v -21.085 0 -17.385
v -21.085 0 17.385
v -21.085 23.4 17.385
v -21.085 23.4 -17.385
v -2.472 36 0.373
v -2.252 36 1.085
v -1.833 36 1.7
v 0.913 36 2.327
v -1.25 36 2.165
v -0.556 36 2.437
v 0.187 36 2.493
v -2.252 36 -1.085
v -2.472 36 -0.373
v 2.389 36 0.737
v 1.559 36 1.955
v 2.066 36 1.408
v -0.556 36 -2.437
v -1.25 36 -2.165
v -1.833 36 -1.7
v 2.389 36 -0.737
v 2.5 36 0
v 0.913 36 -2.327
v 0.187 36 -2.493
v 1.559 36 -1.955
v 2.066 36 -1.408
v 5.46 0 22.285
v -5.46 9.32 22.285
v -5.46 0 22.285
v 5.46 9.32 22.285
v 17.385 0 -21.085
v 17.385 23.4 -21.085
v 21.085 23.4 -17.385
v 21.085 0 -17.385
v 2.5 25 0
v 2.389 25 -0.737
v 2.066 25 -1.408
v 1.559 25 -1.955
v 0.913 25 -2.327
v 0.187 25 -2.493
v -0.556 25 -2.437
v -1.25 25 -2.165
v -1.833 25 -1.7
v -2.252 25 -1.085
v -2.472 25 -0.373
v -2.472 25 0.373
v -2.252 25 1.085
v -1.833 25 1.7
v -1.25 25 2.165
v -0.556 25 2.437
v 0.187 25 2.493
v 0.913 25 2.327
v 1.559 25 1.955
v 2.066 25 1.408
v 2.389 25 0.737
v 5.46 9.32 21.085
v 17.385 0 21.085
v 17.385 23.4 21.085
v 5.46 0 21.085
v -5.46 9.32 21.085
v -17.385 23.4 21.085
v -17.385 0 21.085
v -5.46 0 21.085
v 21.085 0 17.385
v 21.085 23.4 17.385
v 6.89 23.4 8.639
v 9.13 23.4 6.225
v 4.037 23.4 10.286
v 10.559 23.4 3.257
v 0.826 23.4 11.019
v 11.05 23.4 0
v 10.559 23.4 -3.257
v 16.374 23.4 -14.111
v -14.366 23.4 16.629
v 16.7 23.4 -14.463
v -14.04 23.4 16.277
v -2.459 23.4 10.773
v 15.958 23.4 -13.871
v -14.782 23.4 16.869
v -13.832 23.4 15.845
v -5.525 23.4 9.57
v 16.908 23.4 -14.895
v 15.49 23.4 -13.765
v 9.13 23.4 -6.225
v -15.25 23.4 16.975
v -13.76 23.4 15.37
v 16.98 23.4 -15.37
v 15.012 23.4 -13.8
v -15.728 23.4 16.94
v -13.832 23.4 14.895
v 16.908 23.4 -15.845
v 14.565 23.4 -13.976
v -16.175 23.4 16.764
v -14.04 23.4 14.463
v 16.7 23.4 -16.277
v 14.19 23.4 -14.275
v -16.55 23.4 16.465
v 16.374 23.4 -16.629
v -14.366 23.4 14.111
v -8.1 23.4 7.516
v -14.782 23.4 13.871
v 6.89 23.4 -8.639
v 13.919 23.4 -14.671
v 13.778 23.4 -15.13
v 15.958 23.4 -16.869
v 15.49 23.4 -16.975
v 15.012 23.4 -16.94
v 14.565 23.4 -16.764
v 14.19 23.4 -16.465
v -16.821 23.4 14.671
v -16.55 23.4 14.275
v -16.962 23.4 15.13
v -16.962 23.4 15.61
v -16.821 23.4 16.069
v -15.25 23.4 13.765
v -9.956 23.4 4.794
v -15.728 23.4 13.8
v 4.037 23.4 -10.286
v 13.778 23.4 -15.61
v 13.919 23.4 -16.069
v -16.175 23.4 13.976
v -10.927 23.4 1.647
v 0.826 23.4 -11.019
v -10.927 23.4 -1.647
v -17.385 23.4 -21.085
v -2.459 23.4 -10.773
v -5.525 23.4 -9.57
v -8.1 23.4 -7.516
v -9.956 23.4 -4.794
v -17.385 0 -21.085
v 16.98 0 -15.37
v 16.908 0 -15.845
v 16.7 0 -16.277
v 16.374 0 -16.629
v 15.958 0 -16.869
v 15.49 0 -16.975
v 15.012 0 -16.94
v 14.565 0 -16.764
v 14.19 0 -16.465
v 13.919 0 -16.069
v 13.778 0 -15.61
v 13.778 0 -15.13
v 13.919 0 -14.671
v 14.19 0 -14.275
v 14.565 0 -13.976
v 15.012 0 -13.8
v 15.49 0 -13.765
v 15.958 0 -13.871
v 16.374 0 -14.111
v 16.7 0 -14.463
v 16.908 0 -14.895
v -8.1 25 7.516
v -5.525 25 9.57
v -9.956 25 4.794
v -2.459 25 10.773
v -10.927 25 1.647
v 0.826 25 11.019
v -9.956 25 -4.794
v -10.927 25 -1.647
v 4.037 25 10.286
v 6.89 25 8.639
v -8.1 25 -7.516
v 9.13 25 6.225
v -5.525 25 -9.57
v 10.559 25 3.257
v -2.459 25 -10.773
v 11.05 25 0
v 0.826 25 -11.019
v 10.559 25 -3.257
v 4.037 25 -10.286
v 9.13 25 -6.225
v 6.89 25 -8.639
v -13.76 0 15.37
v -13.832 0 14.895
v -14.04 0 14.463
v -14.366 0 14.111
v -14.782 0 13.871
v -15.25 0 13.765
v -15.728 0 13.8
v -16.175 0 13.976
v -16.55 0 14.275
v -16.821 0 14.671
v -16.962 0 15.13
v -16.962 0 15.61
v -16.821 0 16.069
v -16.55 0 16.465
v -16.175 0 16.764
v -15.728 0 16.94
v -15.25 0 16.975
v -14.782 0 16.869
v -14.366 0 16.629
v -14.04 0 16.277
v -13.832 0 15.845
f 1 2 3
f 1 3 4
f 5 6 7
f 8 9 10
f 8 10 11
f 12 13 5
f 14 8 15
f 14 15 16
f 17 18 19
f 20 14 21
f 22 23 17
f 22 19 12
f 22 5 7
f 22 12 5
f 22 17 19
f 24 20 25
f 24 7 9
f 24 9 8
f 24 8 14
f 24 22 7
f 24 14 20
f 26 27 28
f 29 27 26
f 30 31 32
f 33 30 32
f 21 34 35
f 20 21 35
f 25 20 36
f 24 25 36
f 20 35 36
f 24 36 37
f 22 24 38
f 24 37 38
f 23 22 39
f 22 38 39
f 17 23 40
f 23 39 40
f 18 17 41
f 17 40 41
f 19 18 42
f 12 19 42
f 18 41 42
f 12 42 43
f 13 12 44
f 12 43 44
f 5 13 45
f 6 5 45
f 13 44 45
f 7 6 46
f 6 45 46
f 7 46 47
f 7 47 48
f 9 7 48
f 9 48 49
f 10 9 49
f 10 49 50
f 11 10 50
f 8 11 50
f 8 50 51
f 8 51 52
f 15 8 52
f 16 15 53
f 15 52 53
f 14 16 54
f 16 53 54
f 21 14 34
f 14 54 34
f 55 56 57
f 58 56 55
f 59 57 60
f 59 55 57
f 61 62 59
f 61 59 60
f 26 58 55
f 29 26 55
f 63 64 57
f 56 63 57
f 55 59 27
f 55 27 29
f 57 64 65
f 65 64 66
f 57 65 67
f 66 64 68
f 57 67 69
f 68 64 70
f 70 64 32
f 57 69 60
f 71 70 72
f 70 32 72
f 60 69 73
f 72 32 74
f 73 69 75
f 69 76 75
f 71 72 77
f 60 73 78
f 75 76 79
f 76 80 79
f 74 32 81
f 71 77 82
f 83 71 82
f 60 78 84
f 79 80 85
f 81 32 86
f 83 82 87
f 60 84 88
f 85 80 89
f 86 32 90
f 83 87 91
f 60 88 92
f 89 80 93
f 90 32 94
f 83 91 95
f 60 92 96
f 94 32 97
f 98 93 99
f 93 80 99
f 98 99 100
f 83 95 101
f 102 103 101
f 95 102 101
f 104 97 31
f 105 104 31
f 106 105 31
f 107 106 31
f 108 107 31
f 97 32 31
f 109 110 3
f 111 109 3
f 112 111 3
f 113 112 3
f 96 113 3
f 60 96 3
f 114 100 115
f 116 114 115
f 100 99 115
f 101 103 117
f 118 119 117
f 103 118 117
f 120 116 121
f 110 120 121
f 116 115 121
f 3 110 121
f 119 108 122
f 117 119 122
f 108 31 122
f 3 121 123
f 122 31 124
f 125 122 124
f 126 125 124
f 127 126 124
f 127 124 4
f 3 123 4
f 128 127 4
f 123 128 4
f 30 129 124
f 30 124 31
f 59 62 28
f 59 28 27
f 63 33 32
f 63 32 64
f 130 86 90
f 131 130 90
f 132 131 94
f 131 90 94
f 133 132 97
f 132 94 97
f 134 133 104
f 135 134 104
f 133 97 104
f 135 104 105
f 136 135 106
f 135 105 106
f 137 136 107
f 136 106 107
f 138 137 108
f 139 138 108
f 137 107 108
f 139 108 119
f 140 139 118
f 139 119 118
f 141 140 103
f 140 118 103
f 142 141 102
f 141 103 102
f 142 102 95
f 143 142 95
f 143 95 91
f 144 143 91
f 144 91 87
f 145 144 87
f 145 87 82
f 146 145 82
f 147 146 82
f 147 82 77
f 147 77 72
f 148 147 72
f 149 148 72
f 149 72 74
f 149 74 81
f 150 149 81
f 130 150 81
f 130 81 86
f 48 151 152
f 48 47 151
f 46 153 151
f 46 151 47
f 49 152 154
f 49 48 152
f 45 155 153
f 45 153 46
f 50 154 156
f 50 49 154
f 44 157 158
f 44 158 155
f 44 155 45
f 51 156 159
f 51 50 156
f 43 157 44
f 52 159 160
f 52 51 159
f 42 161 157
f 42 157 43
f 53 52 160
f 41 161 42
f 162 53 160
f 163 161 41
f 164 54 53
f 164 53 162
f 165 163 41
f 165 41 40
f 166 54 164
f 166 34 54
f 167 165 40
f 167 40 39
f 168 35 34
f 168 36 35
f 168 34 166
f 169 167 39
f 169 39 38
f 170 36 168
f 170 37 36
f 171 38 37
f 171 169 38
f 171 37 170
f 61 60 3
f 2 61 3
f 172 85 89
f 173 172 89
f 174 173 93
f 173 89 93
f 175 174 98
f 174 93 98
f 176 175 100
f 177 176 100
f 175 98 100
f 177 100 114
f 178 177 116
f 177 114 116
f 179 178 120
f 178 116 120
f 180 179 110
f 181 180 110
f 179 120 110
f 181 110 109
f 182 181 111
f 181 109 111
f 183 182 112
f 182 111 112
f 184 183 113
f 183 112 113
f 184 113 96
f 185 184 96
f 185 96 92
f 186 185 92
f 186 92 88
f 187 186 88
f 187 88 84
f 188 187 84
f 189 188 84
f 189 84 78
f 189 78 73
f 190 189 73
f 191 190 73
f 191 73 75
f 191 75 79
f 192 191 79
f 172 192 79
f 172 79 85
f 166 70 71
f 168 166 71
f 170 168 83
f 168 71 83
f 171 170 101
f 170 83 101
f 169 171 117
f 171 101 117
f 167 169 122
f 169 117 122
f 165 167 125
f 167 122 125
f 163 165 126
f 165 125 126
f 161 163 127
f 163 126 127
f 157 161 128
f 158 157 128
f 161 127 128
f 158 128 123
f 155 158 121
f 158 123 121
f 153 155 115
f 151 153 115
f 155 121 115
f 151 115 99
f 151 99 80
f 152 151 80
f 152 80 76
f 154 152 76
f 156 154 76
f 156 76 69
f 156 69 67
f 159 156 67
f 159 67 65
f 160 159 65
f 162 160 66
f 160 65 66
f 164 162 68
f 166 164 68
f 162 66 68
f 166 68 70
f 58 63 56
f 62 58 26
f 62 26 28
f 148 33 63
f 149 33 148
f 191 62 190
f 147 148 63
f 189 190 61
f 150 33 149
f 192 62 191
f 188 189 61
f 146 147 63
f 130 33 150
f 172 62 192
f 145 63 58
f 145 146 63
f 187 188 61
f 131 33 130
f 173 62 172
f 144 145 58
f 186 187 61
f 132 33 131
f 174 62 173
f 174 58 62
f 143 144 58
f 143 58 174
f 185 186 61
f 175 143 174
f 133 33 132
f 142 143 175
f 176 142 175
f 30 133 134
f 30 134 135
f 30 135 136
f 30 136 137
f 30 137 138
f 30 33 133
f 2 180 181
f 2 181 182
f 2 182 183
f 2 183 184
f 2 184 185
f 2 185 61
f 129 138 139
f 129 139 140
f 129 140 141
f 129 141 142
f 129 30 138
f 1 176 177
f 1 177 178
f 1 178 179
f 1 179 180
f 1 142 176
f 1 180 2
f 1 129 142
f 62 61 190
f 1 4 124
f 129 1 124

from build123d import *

# Parameters (mm, degrees)
BOSS_EXTRUDE1_DEPTH = 23.4
SKETCH2_W           = 10.92
SKETCH2_H           = 9.32
BOSS_EXTRUDE2_DEPTH = 1.2
SKETCH3_R           = 1.61
CUT_EXTRUDE1_DEPTH  = 24.4
SKETCH4_R           = 11.05
BOSS_EXTRUDE3_DEPTH = 1.6
SKETCH5_R           = 2.5
BOSS_EXTRUDE4_DEPTH = 11


with BuildPart() as part:
    # Sketch1 → Boss-Extrude1 (new body)
    with BuildSketch(Plane(origin=(0, 0, 0), x_dir=(1, 0, 0), z_dir=(0, 1, 0))):
        Polygon((-17.385, 21.085), (17.385, 21.085), (21.085, 17.385), (21.085, -17.385), (17.385, -21.085), (-17.385, -21.085), (-21.085, -17.385), (-21.085, 17.385), align=None)
    extrude(amount=BOSS_EXTRUDE1_DEPTH)

    # Sketch2 → Boss-Extrude2 (add)
    with BuildSketch(Plane.XY.offset(21.085)):
        with Locations((0, 4.66)):
            Rectangle(SKETCH2_W, SKETCH2_H)
    extrude(amount=BOSS_EXTRUDE2_DEPTH)

    # Sketch3 → Cut-Extrude1 (cut, through all)
    with BuildSketch(Plane(origin=(0, 23.4, 0), x_dir=(1, 0, 0), z_dir=(0, 1, 0))):
        with Locations((-15.37, -15.37)):
            Circle(SKETCH3_R)
        with Locations((15.37, 15.37)):
            Circle(SKETCH3_R)
    extrude(amount=-CUT_EXTRUDE1_DEPTH, mode=Mode.SUBTRACT)

    # Sketch4 → Boss-Extrude3 (add)
    with BuildSketch(Plane(origin=(0, 23.4, 0), x_dir=(1, 0, 0), z_dir=(0, 1, 0))):
        Circle(SKETCH4_R)
    extrude(amount=BOSS_EXTRUDE3_DEPTH)

    # Sketch5 → Boss-Extrude4 (add)
    with BuildSketch(Plane(origin=(0, 25, 0), x_dir=(1, 0, 0), z_dir=(0, 1, 0))):
        Circle(SKETCH5_R)
    extrude(amount=BOSS_EXTRUDE4_DEPTH)


solid = part.part
